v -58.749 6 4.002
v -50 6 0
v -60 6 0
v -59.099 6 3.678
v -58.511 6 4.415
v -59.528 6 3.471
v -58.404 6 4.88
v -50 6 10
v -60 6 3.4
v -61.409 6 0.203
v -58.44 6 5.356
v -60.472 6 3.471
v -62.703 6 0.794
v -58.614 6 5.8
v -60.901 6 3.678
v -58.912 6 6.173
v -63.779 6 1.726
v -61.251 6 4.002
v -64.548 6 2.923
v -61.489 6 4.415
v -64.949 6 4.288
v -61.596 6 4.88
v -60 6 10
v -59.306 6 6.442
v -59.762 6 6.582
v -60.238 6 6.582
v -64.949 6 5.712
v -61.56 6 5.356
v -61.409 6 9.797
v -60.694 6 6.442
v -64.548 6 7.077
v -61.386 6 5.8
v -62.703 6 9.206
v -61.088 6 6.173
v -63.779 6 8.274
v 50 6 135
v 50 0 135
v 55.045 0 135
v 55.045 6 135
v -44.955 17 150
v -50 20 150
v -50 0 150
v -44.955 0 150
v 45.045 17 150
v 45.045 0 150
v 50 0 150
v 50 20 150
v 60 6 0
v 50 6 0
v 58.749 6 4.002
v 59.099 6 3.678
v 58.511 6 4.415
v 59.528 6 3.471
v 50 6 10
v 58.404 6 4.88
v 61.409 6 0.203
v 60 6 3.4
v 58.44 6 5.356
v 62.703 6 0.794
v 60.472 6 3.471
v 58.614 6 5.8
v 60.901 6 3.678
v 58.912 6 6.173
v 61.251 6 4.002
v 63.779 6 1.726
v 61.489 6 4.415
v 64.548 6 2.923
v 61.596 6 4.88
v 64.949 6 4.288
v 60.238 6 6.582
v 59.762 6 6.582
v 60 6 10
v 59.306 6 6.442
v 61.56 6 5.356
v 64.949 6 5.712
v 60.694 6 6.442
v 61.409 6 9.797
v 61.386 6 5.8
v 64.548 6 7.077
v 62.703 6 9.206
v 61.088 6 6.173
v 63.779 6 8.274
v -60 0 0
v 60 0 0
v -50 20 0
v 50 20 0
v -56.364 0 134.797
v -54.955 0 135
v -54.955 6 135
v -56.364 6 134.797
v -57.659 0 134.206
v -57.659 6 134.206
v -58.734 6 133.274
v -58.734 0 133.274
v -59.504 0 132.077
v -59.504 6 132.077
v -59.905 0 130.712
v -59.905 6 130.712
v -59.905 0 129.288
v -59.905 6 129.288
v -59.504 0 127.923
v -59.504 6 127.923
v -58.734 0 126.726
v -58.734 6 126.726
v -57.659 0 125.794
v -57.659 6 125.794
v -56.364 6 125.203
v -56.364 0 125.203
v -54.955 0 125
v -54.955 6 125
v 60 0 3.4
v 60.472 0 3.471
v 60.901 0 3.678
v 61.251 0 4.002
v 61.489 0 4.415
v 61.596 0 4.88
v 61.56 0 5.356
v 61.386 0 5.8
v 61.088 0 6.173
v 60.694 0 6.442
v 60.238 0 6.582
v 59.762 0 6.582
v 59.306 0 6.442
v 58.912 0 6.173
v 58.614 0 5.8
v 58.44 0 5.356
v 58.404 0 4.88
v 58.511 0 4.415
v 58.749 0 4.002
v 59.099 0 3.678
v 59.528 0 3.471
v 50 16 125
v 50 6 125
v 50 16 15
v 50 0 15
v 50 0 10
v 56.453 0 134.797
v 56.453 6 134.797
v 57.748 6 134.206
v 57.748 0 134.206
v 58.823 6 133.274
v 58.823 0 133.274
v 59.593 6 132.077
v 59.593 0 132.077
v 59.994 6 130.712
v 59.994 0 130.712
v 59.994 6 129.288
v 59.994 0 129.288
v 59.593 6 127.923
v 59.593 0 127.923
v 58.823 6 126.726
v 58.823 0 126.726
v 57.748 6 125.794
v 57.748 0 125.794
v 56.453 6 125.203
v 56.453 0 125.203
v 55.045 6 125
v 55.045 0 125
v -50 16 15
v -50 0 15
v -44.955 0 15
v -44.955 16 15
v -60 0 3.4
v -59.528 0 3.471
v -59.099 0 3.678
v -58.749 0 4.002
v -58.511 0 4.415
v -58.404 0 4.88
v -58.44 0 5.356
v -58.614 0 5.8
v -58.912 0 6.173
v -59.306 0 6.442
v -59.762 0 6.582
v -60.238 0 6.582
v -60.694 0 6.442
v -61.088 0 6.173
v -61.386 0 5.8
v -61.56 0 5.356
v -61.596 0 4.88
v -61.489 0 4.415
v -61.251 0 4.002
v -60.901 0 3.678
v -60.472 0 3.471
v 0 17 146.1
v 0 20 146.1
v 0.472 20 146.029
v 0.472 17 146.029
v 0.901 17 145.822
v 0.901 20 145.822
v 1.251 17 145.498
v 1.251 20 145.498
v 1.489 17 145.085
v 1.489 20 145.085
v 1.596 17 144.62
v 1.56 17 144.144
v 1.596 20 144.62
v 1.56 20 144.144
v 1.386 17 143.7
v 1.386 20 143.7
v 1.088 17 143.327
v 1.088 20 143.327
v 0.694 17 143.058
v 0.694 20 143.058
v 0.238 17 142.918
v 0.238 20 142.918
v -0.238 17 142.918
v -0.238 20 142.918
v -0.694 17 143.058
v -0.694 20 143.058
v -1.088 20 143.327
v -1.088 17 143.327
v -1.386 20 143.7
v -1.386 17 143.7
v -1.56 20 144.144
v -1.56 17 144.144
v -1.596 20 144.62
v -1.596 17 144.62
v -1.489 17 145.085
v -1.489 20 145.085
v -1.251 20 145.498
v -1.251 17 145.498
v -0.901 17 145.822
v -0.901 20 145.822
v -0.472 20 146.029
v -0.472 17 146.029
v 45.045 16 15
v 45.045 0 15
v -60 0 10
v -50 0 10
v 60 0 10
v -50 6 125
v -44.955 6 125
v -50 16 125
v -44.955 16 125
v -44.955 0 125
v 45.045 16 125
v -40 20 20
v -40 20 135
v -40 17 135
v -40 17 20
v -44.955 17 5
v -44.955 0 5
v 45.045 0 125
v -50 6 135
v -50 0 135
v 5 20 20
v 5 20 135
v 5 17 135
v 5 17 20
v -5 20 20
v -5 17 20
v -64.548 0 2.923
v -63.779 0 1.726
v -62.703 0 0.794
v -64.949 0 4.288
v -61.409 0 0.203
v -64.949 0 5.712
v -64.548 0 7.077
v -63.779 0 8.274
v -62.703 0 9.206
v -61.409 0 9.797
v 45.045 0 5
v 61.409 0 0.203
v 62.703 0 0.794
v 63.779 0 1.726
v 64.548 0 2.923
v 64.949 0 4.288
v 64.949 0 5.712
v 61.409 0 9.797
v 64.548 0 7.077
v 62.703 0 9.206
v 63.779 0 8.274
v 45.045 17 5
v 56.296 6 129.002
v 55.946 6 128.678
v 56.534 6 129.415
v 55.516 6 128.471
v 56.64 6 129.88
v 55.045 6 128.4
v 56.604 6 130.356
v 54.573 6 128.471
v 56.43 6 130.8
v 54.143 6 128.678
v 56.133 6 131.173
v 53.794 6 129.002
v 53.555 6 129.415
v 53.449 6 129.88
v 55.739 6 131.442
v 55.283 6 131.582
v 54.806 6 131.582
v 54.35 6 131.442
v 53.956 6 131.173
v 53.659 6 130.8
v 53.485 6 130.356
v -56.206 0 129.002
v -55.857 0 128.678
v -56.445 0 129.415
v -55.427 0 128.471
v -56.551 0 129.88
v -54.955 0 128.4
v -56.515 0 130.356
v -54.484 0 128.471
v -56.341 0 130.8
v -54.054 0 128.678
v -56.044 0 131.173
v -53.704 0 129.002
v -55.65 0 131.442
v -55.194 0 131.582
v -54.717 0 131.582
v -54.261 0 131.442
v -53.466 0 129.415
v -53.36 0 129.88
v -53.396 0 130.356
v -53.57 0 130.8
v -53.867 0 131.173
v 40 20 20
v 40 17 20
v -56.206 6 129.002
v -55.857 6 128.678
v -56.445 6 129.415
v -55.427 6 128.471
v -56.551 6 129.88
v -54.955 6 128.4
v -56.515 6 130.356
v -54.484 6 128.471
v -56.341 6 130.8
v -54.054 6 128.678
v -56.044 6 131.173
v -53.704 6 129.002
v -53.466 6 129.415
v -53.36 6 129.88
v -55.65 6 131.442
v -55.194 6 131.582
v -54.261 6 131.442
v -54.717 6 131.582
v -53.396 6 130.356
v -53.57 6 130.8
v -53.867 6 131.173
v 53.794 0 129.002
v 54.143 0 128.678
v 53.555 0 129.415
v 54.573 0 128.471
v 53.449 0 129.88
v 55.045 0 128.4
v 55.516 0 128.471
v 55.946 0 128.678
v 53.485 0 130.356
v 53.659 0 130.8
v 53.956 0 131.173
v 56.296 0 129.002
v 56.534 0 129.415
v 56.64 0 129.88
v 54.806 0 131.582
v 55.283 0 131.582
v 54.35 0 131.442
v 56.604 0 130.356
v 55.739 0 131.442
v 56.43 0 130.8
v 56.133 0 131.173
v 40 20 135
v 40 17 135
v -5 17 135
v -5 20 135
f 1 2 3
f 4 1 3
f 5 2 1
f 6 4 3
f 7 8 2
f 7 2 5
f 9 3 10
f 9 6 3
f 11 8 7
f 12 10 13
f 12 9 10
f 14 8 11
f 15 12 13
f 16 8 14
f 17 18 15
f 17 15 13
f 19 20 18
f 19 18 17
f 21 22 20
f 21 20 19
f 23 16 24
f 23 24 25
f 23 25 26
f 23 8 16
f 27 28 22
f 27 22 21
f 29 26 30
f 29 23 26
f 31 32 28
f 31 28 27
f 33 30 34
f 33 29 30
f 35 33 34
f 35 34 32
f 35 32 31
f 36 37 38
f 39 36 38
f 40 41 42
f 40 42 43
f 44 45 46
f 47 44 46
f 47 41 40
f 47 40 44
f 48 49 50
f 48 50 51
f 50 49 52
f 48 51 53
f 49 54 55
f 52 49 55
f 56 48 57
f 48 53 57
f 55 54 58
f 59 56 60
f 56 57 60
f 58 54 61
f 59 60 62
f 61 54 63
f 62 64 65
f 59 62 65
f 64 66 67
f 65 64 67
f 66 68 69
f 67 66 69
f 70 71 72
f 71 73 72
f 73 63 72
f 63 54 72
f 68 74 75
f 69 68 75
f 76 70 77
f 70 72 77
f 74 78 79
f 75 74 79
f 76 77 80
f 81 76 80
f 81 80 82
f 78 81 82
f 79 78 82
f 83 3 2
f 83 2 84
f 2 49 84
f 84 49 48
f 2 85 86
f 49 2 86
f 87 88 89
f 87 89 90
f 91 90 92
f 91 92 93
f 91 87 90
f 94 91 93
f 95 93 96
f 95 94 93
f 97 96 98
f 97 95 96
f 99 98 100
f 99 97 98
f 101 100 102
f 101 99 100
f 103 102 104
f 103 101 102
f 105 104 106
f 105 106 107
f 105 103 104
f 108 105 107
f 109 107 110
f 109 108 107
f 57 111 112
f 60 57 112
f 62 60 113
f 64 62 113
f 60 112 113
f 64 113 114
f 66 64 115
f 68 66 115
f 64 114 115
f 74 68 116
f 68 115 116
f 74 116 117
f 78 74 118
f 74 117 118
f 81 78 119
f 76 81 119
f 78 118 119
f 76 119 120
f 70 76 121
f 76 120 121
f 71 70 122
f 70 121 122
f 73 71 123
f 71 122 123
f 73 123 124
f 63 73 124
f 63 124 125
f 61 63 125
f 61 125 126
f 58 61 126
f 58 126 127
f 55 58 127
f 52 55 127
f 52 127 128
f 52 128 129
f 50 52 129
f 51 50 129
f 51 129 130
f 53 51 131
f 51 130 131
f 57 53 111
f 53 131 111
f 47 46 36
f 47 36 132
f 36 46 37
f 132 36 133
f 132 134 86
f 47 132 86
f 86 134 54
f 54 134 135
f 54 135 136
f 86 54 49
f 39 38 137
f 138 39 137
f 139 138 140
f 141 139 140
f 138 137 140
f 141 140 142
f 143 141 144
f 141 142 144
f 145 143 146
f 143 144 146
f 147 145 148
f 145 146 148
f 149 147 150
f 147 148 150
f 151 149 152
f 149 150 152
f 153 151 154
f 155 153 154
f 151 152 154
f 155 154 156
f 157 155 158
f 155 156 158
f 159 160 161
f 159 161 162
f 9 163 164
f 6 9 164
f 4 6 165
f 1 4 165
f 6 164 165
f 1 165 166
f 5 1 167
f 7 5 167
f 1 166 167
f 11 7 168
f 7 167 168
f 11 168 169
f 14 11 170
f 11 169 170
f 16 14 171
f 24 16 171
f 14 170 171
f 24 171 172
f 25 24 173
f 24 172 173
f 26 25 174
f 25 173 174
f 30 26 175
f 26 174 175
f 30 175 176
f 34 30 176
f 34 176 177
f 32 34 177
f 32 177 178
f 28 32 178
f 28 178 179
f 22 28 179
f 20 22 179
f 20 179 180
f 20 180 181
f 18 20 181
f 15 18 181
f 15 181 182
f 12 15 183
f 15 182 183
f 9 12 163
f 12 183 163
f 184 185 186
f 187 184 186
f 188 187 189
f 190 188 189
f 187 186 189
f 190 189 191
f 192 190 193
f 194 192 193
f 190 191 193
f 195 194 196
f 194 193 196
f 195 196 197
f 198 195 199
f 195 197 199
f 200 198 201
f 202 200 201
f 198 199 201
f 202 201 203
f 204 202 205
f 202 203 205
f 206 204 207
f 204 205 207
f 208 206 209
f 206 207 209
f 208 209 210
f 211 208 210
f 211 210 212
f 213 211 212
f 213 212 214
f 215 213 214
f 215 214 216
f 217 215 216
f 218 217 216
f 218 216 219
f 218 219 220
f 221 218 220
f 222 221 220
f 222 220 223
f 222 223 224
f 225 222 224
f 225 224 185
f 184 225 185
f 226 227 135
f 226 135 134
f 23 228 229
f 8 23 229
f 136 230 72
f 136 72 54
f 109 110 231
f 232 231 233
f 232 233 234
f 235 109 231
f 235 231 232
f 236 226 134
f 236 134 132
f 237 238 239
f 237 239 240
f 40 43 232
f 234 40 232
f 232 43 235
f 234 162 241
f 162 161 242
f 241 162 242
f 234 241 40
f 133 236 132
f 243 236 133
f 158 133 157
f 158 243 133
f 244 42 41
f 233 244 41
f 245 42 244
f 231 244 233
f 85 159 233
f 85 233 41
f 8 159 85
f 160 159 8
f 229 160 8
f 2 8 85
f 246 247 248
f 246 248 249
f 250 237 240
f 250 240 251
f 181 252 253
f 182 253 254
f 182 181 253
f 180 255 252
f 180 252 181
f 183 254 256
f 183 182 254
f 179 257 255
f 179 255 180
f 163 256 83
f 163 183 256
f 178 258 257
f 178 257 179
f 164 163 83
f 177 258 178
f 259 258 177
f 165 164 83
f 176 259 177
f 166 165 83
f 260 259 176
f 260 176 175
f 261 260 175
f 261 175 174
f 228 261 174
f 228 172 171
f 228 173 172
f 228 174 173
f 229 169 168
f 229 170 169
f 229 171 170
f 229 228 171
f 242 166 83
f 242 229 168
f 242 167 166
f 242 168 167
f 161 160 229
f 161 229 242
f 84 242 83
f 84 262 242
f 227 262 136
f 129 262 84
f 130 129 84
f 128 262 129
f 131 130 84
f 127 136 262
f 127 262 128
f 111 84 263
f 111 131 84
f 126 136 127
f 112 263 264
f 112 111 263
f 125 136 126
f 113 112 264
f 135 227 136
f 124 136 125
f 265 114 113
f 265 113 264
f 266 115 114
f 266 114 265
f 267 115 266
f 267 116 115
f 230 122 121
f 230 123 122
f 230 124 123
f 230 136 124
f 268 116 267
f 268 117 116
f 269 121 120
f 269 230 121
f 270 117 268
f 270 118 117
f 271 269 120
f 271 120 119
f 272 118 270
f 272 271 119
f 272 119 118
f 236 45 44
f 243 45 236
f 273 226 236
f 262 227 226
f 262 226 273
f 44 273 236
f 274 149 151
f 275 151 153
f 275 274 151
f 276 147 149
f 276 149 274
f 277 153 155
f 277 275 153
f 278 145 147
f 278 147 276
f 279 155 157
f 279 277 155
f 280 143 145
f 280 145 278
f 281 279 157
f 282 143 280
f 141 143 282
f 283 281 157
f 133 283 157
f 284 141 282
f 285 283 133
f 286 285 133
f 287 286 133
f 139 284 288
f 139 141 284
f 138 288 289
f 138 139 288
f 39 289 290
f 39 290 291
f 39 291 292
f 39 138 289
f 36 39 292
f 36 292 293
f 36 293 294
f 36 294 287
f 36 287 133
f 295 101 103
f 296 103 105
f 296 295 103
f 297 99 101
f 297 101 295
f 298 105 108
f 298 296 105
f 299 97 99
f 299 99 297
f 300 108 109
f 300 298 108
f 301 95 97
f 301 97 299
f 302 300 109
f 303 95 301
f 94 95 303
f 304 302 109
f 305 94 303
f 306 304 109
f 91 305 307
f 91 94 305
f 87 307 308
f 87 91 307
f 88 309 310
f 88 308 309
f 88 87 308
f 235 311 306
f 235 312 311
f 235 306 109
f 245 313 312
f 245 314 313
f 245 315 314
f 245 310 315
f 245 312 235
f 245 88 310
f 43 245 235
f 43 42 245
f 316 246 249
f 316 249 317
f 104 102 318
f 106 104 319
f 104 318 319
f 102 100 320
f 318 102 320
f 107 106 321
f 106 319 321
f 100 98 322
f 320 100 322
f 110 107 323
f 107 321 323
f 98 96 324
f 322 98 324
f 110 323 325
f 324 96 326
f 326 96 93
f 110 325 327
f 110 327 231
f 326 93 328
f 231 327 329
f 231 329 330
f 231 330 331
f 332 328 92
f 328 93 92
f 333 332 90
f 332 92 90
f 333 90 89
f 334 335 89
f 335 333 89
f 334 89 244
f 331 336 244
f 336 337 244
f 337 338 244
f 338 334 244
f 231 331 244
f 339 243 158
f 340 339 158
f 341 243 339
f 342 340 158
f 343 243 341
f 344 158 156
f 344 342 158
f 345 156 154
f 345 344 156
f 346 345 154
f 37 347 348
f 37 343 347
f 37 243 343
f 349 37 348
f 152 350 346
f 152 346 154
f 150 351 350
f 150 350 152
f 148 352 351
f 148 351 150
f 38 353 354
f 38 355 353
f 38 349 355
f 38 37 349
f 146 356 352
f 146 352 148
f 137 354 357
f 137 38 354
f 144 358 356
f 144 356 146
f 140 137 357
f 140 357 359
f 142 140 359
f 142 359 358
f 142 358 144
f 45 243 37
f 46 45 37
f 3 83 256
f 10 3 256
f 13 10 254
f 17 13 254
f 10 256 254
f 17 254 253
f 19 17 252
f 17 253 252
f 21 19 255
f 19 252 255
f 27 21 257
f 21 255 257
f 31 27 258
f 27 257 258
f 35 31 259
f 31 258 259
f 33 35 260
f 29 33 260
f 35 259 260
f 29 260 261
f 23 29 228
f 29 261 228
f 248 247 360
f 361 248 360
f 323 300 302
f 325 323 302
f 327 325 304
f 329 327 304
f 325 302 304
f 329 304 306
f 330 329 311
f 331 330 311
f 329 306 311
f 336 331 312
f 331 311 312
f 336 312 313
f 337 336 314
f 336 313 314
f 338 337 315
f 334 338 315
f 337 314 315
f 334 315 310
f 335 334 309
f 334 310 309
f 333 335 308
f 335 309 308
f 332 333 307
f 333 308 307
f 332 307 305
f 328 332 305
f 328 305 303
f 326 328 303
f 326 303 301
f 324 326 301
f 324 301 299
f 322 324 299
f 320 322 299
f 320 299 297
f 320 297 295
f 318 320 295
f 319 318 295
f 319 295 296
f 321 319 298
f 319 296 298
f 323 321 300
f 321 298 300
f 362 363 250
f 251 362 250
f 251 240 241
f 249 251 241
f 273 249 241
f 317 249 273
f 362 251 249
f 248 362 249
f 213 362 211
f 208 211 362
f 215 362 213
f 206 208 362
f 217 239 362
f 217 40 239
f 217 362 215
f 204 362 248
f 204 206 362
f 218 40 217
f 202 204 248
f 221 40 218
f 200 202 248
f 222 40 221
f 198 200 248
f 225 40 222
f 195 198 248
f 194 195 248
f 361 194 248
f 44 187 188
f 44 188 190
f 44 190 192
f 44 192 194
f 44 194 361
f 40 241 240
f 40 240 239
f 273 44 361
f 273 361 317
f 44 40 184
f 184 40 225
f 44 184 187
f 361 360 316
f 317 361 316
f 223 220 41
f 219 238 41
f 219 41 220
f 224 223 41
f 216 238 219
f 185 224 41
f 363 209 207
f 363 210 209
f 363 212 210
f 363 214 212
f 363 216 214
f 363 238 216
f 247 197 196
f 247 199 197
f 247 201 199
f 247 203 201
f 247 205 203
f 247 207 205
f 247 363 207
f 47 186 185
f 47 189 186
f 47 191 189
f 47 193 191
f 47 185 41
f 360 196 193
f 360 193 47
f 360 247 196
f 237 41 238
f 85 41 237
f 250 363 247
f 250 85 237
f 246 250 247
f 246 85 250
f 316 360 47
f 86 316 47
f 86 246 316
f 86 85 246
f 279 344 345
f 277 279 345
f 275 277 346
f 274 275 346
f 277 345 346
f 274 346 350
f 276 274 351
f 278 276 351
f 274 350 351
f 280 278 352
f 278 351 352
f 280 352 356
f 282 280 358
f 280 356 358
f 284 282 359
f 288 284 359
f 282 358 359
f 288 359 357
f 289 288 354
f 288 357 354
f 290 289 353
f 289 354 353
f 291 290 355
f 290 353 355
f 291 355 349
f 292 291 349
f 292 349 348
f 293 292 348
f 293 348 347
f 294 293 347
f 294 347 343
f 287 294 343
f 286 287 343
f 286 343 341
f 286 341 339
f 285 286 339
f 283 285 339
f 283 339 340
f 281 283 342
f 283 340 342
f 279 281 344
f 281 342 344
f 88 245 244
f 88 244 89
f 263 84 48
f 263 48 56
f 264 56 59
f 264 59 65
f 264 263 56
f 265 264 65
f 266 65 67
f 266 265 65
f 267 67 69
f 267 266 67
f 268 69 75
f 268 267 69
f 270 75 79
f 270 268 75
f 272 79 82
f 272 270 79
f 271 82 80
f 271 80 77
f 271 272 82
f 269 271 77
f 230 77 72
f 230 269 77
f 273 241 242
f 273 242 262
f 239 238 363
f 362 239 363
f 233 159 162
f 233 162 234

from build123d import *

# Parameters (mm, degrees)
SKETCH_2_W          = 100
SKETCH_2_H          = 40
EXTRUDE_1_DEPTH     = 150
SKETCH_3_W          = 90
SKETCH_3_H          = 32
CUT_EXTRUDE_1_DEPTH = 145
SKETCH_4_W          = 30
SKETCH_4_H          = 115
CUT_EXTRUDE_2_DEPTH = 20
SKETCH_5_W          = 35
SKETCH_5_H          = 115
CUT_EXTRUDE_3_DEPTH = 20
SKETCH_6_W          = 120
SKETCH_6_H          = 31
CUT_EXTRUDE_4_DEPTH = 207
SKETCH_7_R          = 1.5
CUT_EXTRUDE_5_DEPTH = 15
SKETCH_8_R          = 2.5
CUT_EXTRUDE_6_DEPTH = 15
SKETCH_10_W         = 4
SKETCH_10_H         = 18
EXTRUDE_2_DEPTH     = 5
SKETCH_11_W         = 100
SKETCH_11_H         = 150
CUT_EXTRUDE_7_DEPTH = 20
SKETCH_12_R         = 1.6
EXTRUDE_5_DEPTH     = 6
EXTRUDE_6_REACH     = 166.076
SKETCH_13_W         = 4.955411511
SKETCH_13_H         = 10
SKETCH_13_W_2       = 5.044588489
SKETCH_14_R         = 1.6
CUT_EXTRUDE_8_DEPTH = 10


with BuildPart() as part:
    # 草图2 → 凸台-拉伸1 (new body)
    with BuildSketch(Plane.XY):
        Rectangle(SKETCH_2_W, SKETCH_2_H)
    extrude(amount=EXTRUDE_1_DEPTH)

    # 草图3 → 切除-拉伸1 (cut)
    with BuildSketch(Plane.XY.offset(150)):
        with Locations((0.044588489, 1)):
            Rectangle(SKETCH_3_W, SKETCH_3_H)
    extrude(amount=-CUT_EXTRUDE_1_DEPTH, mode=Mode.SUBTRACT)

    # 草图4 → 切除-拉伸2 (cut)
    with BuildSketch(Plane.XZ.offset(20)):
        with Locations((-25, 77.5)):
            Rectangle(SKETCH_4_W, SKETCH_4_H)
        with Locations((25, 77.5)):
            Rectangle(SKETCH_4_W, SKETCH_4_H)
    extrude(amount=-CUT_EXTRUDE_2_DEPTH, mode=Mode.SUBTRACT)

    # 草图5 → 切除-拉伸3 (cut)
    with BuildSketch(Plane(origin=(0, 20, 0), x_dir=(1, 0, 0), z_dir=(0, 1, 0))):
        with Locations((-22.5, -77.5)):
            Rectangle(SKETCH_5_W, SKETCH_5_H)
        with Locations((22.5, -77.5)):
            Rectangle(SKETCH_5_W, SKETCH_5_H)
    extrude(amount=-CUT_EXTRUDE_3_DEPTH, mode=Mode.SUBTRACT)

    # 草图6 → 切除-拉伸4 (cut)
    with BuildSketch(Plane.ZY.offset(50)):
        with Locations((75, 0.5)):
            Rectangle(SKETCH_6_W, SKETCH_6_H)
    extrude(amount=-CUT_EXTRUDE_4_DEPTH, mode=Mode.SUBTRACT)

    # 草图7 → 切除-拉伸5 (cut)
    with BuildSketch(Plane.XZ.offset(20)):
        with Locations(Location((-5, 134, 0), (0, 0, 270))):
            Circle(SKETCH_7_R)
        with Locations(Location((5, 134, 0), (0, 0, 270))):
            Circle(SKETCH_7_R)
        with Locations(Location((5, 124, 0), (0, 0, 270))):
            Circle(SKETCH_7_R)
        with Locations(Location((-5, 124, 0), (0, 0, 270))):
            Circle(SKETCH_7_R)
    extrude(amount=-CUT_EXTRUDE_5_DEPTH, mode=Mode.SUBTRACT)

    # 草图8 → 切除-拉伸6 (cut)
    with BuildSketch(Plane.XZ.offset(20)):
        with Locations(Location((0, 129, 0), (0, 0, 270))):
            Circle(SKETCH_8_R)
    extrude(amount=-CUT_EXTRUDE_6_DEPTH, mode=Mode.SUBTRACT)

    # 草图10 → 凸台-拉伸2 (add)
    with BuildSketch(Plane.XZ.offset(20)):
        with Locations((-12, 126)):
            Rectangle(SKETCH_10_W, SKETCH_10_H)
        with Locations((12, 126)):
            Rectangle(SKETCH_10_W, SKETCH_10_H)
    extrude(amount=-EXTRUDE_2_DEPTH)

    # 草图11 → 切除-拉伸7 (cut)
    with BuildSketch(Plane.XZ.offset(20)):
        with Locations((0, 75)):
            Rectangle(SKETCH_11_W, SKETCH_11_H)
    extrude(amount=-CUT_EXTRUDE_7_DEPTH, mode=Mode.SUBTRACT)

    # 草图12 → 凸台-拉伸5 (add)
    # profile 1 of 4: a face of its own
    with BuildSketch(Plane.XZ):
        with BuildLine():
            Line((-44.955411511, 135), (-54.955411511, 135))
            ThreePointArc((-54.955411511, 135), (-59.955411511, 130), (-54.955411511, 125))
            Line((-54.955411511, 125), (-44.955411511, 125))
            Line((-44.955411511, 125), (-44.955411511, 135))
        make_face()
        with Locations(Location((-54.955411511, 130, 0), (0, 0, 270))):
            Circle(SKETCH_12_R, mode=Mode.SUBTRACT)
    # profile 2 of 4: a face of its own
    with BuildSketch(Plane.XZ):
        with BuildLine():
            Line((50, 0), (60, 0))
            ThreePointArc((60, 0), (65, 5), (60, 10))
            Line((60, 10), (50, 10))
            Line((50, 10), (50, 0))
        make_face()
        with Locations(Location((60, 5, 0), (0, 0, 270))):
            Circle(SKETCH_12_R, mode=Mode.SUBTRACT)
    # profile 3 of 4: a face of its own
    with BuildSketch(Plane.XZ):
        with BuildLine():
            Line((45.044588489, 135), (55.044588489, 135))
            ThreePointArc((55.044588489, 135), (60.044588489, 130), (55.044588489, 125))
            Line((55.044588489, 125), (45.044588489, 125))
            Line((45.044588489, 125), (45.044588489, 135))
        make_face()
        with Locations(Location((55.044588489, 130, 0), (0, 0, 270))):
            Circle(SKETCH_12_R, mode=Mode.SUBTRACT)
    # profile 4 of 4: a face of its own
    with BuildSketch(Plane.XZ):
        with BuildLine():
            Line((-50, 0), (-60, 0))
            ThreePointArc((-60, 0), (-65, 5), (-60, 10))
            Line((-60, 10), (-50, 10))
            Line((-50, 10), (-50, 0))
        make_face()
        with Locations(Location((-60, 5, 0), (0, 0, 270))):
            Circle(SKETCH_12_R, mode=Mode.SUBTRACT)
    extrude(amount=-EXTRUDE_5_DEPTH)

    # 草图13 → 凸台-拉伸6 (add, up to next)
    with BuildSketch(Plane(origin=(0, 6, 0), x_dir=(1, 0, 0), z_dir=(0, 1, 0)), mode=Mode.PRIVATE) as extrude_6_sk1:
        with Locations((47.522294245, -130)):
            Rectangle(SKETCH_13_W, SKETCH_13_H)
    extrude_6_tool1 = extrude(extrude_6_sk1.sketch, amount=EXTRUDE_6_REACH, mode=Mode.PRIVATE) - part.part
    # 草图13 → 凸台-拉伸6 (add, up to next)
    with BuildSketch(Plane(origin=(0, 6, 0), x_dir=(1, 0, 0), z_dir=(0, 1, 0)), mode=Mode.PRIVATE) as extrude_6_sk2:
        with Locations((-47.477705755, -130)):
            Rectangle(SKETCH_13_W_2, SKETCH_13_H)
    extrude_6_tool2 = extrude(extrude_6_sk2.sketch, amount=EXTRUDE_6_REACH, mode=Mode.PRIVATE) - part.part
    add(extrude_6_tool1.solids().sort_by_distance((47.522294, 6, 130))[0])
    add(extrude_6_tool2.solids().sort_by_distance((-47.477706, 6, 130))[0])

    # 草图14 → 切除-拉伸8 (cut)
    with BuildSketch(Plane(origin=(0, 20, 0), x_dir=(1, 0, 0), z_dir=(0, 1, 0))):
        with Locations(Location((0, -144.5, 0), (0, 0, 270))):
            Circle(SKETCH_14_R)
    extrude(amount=-CUT_EXTRUDE_8_DEPTH, mode=Mode.SUBTRACT)


solid = part.part
